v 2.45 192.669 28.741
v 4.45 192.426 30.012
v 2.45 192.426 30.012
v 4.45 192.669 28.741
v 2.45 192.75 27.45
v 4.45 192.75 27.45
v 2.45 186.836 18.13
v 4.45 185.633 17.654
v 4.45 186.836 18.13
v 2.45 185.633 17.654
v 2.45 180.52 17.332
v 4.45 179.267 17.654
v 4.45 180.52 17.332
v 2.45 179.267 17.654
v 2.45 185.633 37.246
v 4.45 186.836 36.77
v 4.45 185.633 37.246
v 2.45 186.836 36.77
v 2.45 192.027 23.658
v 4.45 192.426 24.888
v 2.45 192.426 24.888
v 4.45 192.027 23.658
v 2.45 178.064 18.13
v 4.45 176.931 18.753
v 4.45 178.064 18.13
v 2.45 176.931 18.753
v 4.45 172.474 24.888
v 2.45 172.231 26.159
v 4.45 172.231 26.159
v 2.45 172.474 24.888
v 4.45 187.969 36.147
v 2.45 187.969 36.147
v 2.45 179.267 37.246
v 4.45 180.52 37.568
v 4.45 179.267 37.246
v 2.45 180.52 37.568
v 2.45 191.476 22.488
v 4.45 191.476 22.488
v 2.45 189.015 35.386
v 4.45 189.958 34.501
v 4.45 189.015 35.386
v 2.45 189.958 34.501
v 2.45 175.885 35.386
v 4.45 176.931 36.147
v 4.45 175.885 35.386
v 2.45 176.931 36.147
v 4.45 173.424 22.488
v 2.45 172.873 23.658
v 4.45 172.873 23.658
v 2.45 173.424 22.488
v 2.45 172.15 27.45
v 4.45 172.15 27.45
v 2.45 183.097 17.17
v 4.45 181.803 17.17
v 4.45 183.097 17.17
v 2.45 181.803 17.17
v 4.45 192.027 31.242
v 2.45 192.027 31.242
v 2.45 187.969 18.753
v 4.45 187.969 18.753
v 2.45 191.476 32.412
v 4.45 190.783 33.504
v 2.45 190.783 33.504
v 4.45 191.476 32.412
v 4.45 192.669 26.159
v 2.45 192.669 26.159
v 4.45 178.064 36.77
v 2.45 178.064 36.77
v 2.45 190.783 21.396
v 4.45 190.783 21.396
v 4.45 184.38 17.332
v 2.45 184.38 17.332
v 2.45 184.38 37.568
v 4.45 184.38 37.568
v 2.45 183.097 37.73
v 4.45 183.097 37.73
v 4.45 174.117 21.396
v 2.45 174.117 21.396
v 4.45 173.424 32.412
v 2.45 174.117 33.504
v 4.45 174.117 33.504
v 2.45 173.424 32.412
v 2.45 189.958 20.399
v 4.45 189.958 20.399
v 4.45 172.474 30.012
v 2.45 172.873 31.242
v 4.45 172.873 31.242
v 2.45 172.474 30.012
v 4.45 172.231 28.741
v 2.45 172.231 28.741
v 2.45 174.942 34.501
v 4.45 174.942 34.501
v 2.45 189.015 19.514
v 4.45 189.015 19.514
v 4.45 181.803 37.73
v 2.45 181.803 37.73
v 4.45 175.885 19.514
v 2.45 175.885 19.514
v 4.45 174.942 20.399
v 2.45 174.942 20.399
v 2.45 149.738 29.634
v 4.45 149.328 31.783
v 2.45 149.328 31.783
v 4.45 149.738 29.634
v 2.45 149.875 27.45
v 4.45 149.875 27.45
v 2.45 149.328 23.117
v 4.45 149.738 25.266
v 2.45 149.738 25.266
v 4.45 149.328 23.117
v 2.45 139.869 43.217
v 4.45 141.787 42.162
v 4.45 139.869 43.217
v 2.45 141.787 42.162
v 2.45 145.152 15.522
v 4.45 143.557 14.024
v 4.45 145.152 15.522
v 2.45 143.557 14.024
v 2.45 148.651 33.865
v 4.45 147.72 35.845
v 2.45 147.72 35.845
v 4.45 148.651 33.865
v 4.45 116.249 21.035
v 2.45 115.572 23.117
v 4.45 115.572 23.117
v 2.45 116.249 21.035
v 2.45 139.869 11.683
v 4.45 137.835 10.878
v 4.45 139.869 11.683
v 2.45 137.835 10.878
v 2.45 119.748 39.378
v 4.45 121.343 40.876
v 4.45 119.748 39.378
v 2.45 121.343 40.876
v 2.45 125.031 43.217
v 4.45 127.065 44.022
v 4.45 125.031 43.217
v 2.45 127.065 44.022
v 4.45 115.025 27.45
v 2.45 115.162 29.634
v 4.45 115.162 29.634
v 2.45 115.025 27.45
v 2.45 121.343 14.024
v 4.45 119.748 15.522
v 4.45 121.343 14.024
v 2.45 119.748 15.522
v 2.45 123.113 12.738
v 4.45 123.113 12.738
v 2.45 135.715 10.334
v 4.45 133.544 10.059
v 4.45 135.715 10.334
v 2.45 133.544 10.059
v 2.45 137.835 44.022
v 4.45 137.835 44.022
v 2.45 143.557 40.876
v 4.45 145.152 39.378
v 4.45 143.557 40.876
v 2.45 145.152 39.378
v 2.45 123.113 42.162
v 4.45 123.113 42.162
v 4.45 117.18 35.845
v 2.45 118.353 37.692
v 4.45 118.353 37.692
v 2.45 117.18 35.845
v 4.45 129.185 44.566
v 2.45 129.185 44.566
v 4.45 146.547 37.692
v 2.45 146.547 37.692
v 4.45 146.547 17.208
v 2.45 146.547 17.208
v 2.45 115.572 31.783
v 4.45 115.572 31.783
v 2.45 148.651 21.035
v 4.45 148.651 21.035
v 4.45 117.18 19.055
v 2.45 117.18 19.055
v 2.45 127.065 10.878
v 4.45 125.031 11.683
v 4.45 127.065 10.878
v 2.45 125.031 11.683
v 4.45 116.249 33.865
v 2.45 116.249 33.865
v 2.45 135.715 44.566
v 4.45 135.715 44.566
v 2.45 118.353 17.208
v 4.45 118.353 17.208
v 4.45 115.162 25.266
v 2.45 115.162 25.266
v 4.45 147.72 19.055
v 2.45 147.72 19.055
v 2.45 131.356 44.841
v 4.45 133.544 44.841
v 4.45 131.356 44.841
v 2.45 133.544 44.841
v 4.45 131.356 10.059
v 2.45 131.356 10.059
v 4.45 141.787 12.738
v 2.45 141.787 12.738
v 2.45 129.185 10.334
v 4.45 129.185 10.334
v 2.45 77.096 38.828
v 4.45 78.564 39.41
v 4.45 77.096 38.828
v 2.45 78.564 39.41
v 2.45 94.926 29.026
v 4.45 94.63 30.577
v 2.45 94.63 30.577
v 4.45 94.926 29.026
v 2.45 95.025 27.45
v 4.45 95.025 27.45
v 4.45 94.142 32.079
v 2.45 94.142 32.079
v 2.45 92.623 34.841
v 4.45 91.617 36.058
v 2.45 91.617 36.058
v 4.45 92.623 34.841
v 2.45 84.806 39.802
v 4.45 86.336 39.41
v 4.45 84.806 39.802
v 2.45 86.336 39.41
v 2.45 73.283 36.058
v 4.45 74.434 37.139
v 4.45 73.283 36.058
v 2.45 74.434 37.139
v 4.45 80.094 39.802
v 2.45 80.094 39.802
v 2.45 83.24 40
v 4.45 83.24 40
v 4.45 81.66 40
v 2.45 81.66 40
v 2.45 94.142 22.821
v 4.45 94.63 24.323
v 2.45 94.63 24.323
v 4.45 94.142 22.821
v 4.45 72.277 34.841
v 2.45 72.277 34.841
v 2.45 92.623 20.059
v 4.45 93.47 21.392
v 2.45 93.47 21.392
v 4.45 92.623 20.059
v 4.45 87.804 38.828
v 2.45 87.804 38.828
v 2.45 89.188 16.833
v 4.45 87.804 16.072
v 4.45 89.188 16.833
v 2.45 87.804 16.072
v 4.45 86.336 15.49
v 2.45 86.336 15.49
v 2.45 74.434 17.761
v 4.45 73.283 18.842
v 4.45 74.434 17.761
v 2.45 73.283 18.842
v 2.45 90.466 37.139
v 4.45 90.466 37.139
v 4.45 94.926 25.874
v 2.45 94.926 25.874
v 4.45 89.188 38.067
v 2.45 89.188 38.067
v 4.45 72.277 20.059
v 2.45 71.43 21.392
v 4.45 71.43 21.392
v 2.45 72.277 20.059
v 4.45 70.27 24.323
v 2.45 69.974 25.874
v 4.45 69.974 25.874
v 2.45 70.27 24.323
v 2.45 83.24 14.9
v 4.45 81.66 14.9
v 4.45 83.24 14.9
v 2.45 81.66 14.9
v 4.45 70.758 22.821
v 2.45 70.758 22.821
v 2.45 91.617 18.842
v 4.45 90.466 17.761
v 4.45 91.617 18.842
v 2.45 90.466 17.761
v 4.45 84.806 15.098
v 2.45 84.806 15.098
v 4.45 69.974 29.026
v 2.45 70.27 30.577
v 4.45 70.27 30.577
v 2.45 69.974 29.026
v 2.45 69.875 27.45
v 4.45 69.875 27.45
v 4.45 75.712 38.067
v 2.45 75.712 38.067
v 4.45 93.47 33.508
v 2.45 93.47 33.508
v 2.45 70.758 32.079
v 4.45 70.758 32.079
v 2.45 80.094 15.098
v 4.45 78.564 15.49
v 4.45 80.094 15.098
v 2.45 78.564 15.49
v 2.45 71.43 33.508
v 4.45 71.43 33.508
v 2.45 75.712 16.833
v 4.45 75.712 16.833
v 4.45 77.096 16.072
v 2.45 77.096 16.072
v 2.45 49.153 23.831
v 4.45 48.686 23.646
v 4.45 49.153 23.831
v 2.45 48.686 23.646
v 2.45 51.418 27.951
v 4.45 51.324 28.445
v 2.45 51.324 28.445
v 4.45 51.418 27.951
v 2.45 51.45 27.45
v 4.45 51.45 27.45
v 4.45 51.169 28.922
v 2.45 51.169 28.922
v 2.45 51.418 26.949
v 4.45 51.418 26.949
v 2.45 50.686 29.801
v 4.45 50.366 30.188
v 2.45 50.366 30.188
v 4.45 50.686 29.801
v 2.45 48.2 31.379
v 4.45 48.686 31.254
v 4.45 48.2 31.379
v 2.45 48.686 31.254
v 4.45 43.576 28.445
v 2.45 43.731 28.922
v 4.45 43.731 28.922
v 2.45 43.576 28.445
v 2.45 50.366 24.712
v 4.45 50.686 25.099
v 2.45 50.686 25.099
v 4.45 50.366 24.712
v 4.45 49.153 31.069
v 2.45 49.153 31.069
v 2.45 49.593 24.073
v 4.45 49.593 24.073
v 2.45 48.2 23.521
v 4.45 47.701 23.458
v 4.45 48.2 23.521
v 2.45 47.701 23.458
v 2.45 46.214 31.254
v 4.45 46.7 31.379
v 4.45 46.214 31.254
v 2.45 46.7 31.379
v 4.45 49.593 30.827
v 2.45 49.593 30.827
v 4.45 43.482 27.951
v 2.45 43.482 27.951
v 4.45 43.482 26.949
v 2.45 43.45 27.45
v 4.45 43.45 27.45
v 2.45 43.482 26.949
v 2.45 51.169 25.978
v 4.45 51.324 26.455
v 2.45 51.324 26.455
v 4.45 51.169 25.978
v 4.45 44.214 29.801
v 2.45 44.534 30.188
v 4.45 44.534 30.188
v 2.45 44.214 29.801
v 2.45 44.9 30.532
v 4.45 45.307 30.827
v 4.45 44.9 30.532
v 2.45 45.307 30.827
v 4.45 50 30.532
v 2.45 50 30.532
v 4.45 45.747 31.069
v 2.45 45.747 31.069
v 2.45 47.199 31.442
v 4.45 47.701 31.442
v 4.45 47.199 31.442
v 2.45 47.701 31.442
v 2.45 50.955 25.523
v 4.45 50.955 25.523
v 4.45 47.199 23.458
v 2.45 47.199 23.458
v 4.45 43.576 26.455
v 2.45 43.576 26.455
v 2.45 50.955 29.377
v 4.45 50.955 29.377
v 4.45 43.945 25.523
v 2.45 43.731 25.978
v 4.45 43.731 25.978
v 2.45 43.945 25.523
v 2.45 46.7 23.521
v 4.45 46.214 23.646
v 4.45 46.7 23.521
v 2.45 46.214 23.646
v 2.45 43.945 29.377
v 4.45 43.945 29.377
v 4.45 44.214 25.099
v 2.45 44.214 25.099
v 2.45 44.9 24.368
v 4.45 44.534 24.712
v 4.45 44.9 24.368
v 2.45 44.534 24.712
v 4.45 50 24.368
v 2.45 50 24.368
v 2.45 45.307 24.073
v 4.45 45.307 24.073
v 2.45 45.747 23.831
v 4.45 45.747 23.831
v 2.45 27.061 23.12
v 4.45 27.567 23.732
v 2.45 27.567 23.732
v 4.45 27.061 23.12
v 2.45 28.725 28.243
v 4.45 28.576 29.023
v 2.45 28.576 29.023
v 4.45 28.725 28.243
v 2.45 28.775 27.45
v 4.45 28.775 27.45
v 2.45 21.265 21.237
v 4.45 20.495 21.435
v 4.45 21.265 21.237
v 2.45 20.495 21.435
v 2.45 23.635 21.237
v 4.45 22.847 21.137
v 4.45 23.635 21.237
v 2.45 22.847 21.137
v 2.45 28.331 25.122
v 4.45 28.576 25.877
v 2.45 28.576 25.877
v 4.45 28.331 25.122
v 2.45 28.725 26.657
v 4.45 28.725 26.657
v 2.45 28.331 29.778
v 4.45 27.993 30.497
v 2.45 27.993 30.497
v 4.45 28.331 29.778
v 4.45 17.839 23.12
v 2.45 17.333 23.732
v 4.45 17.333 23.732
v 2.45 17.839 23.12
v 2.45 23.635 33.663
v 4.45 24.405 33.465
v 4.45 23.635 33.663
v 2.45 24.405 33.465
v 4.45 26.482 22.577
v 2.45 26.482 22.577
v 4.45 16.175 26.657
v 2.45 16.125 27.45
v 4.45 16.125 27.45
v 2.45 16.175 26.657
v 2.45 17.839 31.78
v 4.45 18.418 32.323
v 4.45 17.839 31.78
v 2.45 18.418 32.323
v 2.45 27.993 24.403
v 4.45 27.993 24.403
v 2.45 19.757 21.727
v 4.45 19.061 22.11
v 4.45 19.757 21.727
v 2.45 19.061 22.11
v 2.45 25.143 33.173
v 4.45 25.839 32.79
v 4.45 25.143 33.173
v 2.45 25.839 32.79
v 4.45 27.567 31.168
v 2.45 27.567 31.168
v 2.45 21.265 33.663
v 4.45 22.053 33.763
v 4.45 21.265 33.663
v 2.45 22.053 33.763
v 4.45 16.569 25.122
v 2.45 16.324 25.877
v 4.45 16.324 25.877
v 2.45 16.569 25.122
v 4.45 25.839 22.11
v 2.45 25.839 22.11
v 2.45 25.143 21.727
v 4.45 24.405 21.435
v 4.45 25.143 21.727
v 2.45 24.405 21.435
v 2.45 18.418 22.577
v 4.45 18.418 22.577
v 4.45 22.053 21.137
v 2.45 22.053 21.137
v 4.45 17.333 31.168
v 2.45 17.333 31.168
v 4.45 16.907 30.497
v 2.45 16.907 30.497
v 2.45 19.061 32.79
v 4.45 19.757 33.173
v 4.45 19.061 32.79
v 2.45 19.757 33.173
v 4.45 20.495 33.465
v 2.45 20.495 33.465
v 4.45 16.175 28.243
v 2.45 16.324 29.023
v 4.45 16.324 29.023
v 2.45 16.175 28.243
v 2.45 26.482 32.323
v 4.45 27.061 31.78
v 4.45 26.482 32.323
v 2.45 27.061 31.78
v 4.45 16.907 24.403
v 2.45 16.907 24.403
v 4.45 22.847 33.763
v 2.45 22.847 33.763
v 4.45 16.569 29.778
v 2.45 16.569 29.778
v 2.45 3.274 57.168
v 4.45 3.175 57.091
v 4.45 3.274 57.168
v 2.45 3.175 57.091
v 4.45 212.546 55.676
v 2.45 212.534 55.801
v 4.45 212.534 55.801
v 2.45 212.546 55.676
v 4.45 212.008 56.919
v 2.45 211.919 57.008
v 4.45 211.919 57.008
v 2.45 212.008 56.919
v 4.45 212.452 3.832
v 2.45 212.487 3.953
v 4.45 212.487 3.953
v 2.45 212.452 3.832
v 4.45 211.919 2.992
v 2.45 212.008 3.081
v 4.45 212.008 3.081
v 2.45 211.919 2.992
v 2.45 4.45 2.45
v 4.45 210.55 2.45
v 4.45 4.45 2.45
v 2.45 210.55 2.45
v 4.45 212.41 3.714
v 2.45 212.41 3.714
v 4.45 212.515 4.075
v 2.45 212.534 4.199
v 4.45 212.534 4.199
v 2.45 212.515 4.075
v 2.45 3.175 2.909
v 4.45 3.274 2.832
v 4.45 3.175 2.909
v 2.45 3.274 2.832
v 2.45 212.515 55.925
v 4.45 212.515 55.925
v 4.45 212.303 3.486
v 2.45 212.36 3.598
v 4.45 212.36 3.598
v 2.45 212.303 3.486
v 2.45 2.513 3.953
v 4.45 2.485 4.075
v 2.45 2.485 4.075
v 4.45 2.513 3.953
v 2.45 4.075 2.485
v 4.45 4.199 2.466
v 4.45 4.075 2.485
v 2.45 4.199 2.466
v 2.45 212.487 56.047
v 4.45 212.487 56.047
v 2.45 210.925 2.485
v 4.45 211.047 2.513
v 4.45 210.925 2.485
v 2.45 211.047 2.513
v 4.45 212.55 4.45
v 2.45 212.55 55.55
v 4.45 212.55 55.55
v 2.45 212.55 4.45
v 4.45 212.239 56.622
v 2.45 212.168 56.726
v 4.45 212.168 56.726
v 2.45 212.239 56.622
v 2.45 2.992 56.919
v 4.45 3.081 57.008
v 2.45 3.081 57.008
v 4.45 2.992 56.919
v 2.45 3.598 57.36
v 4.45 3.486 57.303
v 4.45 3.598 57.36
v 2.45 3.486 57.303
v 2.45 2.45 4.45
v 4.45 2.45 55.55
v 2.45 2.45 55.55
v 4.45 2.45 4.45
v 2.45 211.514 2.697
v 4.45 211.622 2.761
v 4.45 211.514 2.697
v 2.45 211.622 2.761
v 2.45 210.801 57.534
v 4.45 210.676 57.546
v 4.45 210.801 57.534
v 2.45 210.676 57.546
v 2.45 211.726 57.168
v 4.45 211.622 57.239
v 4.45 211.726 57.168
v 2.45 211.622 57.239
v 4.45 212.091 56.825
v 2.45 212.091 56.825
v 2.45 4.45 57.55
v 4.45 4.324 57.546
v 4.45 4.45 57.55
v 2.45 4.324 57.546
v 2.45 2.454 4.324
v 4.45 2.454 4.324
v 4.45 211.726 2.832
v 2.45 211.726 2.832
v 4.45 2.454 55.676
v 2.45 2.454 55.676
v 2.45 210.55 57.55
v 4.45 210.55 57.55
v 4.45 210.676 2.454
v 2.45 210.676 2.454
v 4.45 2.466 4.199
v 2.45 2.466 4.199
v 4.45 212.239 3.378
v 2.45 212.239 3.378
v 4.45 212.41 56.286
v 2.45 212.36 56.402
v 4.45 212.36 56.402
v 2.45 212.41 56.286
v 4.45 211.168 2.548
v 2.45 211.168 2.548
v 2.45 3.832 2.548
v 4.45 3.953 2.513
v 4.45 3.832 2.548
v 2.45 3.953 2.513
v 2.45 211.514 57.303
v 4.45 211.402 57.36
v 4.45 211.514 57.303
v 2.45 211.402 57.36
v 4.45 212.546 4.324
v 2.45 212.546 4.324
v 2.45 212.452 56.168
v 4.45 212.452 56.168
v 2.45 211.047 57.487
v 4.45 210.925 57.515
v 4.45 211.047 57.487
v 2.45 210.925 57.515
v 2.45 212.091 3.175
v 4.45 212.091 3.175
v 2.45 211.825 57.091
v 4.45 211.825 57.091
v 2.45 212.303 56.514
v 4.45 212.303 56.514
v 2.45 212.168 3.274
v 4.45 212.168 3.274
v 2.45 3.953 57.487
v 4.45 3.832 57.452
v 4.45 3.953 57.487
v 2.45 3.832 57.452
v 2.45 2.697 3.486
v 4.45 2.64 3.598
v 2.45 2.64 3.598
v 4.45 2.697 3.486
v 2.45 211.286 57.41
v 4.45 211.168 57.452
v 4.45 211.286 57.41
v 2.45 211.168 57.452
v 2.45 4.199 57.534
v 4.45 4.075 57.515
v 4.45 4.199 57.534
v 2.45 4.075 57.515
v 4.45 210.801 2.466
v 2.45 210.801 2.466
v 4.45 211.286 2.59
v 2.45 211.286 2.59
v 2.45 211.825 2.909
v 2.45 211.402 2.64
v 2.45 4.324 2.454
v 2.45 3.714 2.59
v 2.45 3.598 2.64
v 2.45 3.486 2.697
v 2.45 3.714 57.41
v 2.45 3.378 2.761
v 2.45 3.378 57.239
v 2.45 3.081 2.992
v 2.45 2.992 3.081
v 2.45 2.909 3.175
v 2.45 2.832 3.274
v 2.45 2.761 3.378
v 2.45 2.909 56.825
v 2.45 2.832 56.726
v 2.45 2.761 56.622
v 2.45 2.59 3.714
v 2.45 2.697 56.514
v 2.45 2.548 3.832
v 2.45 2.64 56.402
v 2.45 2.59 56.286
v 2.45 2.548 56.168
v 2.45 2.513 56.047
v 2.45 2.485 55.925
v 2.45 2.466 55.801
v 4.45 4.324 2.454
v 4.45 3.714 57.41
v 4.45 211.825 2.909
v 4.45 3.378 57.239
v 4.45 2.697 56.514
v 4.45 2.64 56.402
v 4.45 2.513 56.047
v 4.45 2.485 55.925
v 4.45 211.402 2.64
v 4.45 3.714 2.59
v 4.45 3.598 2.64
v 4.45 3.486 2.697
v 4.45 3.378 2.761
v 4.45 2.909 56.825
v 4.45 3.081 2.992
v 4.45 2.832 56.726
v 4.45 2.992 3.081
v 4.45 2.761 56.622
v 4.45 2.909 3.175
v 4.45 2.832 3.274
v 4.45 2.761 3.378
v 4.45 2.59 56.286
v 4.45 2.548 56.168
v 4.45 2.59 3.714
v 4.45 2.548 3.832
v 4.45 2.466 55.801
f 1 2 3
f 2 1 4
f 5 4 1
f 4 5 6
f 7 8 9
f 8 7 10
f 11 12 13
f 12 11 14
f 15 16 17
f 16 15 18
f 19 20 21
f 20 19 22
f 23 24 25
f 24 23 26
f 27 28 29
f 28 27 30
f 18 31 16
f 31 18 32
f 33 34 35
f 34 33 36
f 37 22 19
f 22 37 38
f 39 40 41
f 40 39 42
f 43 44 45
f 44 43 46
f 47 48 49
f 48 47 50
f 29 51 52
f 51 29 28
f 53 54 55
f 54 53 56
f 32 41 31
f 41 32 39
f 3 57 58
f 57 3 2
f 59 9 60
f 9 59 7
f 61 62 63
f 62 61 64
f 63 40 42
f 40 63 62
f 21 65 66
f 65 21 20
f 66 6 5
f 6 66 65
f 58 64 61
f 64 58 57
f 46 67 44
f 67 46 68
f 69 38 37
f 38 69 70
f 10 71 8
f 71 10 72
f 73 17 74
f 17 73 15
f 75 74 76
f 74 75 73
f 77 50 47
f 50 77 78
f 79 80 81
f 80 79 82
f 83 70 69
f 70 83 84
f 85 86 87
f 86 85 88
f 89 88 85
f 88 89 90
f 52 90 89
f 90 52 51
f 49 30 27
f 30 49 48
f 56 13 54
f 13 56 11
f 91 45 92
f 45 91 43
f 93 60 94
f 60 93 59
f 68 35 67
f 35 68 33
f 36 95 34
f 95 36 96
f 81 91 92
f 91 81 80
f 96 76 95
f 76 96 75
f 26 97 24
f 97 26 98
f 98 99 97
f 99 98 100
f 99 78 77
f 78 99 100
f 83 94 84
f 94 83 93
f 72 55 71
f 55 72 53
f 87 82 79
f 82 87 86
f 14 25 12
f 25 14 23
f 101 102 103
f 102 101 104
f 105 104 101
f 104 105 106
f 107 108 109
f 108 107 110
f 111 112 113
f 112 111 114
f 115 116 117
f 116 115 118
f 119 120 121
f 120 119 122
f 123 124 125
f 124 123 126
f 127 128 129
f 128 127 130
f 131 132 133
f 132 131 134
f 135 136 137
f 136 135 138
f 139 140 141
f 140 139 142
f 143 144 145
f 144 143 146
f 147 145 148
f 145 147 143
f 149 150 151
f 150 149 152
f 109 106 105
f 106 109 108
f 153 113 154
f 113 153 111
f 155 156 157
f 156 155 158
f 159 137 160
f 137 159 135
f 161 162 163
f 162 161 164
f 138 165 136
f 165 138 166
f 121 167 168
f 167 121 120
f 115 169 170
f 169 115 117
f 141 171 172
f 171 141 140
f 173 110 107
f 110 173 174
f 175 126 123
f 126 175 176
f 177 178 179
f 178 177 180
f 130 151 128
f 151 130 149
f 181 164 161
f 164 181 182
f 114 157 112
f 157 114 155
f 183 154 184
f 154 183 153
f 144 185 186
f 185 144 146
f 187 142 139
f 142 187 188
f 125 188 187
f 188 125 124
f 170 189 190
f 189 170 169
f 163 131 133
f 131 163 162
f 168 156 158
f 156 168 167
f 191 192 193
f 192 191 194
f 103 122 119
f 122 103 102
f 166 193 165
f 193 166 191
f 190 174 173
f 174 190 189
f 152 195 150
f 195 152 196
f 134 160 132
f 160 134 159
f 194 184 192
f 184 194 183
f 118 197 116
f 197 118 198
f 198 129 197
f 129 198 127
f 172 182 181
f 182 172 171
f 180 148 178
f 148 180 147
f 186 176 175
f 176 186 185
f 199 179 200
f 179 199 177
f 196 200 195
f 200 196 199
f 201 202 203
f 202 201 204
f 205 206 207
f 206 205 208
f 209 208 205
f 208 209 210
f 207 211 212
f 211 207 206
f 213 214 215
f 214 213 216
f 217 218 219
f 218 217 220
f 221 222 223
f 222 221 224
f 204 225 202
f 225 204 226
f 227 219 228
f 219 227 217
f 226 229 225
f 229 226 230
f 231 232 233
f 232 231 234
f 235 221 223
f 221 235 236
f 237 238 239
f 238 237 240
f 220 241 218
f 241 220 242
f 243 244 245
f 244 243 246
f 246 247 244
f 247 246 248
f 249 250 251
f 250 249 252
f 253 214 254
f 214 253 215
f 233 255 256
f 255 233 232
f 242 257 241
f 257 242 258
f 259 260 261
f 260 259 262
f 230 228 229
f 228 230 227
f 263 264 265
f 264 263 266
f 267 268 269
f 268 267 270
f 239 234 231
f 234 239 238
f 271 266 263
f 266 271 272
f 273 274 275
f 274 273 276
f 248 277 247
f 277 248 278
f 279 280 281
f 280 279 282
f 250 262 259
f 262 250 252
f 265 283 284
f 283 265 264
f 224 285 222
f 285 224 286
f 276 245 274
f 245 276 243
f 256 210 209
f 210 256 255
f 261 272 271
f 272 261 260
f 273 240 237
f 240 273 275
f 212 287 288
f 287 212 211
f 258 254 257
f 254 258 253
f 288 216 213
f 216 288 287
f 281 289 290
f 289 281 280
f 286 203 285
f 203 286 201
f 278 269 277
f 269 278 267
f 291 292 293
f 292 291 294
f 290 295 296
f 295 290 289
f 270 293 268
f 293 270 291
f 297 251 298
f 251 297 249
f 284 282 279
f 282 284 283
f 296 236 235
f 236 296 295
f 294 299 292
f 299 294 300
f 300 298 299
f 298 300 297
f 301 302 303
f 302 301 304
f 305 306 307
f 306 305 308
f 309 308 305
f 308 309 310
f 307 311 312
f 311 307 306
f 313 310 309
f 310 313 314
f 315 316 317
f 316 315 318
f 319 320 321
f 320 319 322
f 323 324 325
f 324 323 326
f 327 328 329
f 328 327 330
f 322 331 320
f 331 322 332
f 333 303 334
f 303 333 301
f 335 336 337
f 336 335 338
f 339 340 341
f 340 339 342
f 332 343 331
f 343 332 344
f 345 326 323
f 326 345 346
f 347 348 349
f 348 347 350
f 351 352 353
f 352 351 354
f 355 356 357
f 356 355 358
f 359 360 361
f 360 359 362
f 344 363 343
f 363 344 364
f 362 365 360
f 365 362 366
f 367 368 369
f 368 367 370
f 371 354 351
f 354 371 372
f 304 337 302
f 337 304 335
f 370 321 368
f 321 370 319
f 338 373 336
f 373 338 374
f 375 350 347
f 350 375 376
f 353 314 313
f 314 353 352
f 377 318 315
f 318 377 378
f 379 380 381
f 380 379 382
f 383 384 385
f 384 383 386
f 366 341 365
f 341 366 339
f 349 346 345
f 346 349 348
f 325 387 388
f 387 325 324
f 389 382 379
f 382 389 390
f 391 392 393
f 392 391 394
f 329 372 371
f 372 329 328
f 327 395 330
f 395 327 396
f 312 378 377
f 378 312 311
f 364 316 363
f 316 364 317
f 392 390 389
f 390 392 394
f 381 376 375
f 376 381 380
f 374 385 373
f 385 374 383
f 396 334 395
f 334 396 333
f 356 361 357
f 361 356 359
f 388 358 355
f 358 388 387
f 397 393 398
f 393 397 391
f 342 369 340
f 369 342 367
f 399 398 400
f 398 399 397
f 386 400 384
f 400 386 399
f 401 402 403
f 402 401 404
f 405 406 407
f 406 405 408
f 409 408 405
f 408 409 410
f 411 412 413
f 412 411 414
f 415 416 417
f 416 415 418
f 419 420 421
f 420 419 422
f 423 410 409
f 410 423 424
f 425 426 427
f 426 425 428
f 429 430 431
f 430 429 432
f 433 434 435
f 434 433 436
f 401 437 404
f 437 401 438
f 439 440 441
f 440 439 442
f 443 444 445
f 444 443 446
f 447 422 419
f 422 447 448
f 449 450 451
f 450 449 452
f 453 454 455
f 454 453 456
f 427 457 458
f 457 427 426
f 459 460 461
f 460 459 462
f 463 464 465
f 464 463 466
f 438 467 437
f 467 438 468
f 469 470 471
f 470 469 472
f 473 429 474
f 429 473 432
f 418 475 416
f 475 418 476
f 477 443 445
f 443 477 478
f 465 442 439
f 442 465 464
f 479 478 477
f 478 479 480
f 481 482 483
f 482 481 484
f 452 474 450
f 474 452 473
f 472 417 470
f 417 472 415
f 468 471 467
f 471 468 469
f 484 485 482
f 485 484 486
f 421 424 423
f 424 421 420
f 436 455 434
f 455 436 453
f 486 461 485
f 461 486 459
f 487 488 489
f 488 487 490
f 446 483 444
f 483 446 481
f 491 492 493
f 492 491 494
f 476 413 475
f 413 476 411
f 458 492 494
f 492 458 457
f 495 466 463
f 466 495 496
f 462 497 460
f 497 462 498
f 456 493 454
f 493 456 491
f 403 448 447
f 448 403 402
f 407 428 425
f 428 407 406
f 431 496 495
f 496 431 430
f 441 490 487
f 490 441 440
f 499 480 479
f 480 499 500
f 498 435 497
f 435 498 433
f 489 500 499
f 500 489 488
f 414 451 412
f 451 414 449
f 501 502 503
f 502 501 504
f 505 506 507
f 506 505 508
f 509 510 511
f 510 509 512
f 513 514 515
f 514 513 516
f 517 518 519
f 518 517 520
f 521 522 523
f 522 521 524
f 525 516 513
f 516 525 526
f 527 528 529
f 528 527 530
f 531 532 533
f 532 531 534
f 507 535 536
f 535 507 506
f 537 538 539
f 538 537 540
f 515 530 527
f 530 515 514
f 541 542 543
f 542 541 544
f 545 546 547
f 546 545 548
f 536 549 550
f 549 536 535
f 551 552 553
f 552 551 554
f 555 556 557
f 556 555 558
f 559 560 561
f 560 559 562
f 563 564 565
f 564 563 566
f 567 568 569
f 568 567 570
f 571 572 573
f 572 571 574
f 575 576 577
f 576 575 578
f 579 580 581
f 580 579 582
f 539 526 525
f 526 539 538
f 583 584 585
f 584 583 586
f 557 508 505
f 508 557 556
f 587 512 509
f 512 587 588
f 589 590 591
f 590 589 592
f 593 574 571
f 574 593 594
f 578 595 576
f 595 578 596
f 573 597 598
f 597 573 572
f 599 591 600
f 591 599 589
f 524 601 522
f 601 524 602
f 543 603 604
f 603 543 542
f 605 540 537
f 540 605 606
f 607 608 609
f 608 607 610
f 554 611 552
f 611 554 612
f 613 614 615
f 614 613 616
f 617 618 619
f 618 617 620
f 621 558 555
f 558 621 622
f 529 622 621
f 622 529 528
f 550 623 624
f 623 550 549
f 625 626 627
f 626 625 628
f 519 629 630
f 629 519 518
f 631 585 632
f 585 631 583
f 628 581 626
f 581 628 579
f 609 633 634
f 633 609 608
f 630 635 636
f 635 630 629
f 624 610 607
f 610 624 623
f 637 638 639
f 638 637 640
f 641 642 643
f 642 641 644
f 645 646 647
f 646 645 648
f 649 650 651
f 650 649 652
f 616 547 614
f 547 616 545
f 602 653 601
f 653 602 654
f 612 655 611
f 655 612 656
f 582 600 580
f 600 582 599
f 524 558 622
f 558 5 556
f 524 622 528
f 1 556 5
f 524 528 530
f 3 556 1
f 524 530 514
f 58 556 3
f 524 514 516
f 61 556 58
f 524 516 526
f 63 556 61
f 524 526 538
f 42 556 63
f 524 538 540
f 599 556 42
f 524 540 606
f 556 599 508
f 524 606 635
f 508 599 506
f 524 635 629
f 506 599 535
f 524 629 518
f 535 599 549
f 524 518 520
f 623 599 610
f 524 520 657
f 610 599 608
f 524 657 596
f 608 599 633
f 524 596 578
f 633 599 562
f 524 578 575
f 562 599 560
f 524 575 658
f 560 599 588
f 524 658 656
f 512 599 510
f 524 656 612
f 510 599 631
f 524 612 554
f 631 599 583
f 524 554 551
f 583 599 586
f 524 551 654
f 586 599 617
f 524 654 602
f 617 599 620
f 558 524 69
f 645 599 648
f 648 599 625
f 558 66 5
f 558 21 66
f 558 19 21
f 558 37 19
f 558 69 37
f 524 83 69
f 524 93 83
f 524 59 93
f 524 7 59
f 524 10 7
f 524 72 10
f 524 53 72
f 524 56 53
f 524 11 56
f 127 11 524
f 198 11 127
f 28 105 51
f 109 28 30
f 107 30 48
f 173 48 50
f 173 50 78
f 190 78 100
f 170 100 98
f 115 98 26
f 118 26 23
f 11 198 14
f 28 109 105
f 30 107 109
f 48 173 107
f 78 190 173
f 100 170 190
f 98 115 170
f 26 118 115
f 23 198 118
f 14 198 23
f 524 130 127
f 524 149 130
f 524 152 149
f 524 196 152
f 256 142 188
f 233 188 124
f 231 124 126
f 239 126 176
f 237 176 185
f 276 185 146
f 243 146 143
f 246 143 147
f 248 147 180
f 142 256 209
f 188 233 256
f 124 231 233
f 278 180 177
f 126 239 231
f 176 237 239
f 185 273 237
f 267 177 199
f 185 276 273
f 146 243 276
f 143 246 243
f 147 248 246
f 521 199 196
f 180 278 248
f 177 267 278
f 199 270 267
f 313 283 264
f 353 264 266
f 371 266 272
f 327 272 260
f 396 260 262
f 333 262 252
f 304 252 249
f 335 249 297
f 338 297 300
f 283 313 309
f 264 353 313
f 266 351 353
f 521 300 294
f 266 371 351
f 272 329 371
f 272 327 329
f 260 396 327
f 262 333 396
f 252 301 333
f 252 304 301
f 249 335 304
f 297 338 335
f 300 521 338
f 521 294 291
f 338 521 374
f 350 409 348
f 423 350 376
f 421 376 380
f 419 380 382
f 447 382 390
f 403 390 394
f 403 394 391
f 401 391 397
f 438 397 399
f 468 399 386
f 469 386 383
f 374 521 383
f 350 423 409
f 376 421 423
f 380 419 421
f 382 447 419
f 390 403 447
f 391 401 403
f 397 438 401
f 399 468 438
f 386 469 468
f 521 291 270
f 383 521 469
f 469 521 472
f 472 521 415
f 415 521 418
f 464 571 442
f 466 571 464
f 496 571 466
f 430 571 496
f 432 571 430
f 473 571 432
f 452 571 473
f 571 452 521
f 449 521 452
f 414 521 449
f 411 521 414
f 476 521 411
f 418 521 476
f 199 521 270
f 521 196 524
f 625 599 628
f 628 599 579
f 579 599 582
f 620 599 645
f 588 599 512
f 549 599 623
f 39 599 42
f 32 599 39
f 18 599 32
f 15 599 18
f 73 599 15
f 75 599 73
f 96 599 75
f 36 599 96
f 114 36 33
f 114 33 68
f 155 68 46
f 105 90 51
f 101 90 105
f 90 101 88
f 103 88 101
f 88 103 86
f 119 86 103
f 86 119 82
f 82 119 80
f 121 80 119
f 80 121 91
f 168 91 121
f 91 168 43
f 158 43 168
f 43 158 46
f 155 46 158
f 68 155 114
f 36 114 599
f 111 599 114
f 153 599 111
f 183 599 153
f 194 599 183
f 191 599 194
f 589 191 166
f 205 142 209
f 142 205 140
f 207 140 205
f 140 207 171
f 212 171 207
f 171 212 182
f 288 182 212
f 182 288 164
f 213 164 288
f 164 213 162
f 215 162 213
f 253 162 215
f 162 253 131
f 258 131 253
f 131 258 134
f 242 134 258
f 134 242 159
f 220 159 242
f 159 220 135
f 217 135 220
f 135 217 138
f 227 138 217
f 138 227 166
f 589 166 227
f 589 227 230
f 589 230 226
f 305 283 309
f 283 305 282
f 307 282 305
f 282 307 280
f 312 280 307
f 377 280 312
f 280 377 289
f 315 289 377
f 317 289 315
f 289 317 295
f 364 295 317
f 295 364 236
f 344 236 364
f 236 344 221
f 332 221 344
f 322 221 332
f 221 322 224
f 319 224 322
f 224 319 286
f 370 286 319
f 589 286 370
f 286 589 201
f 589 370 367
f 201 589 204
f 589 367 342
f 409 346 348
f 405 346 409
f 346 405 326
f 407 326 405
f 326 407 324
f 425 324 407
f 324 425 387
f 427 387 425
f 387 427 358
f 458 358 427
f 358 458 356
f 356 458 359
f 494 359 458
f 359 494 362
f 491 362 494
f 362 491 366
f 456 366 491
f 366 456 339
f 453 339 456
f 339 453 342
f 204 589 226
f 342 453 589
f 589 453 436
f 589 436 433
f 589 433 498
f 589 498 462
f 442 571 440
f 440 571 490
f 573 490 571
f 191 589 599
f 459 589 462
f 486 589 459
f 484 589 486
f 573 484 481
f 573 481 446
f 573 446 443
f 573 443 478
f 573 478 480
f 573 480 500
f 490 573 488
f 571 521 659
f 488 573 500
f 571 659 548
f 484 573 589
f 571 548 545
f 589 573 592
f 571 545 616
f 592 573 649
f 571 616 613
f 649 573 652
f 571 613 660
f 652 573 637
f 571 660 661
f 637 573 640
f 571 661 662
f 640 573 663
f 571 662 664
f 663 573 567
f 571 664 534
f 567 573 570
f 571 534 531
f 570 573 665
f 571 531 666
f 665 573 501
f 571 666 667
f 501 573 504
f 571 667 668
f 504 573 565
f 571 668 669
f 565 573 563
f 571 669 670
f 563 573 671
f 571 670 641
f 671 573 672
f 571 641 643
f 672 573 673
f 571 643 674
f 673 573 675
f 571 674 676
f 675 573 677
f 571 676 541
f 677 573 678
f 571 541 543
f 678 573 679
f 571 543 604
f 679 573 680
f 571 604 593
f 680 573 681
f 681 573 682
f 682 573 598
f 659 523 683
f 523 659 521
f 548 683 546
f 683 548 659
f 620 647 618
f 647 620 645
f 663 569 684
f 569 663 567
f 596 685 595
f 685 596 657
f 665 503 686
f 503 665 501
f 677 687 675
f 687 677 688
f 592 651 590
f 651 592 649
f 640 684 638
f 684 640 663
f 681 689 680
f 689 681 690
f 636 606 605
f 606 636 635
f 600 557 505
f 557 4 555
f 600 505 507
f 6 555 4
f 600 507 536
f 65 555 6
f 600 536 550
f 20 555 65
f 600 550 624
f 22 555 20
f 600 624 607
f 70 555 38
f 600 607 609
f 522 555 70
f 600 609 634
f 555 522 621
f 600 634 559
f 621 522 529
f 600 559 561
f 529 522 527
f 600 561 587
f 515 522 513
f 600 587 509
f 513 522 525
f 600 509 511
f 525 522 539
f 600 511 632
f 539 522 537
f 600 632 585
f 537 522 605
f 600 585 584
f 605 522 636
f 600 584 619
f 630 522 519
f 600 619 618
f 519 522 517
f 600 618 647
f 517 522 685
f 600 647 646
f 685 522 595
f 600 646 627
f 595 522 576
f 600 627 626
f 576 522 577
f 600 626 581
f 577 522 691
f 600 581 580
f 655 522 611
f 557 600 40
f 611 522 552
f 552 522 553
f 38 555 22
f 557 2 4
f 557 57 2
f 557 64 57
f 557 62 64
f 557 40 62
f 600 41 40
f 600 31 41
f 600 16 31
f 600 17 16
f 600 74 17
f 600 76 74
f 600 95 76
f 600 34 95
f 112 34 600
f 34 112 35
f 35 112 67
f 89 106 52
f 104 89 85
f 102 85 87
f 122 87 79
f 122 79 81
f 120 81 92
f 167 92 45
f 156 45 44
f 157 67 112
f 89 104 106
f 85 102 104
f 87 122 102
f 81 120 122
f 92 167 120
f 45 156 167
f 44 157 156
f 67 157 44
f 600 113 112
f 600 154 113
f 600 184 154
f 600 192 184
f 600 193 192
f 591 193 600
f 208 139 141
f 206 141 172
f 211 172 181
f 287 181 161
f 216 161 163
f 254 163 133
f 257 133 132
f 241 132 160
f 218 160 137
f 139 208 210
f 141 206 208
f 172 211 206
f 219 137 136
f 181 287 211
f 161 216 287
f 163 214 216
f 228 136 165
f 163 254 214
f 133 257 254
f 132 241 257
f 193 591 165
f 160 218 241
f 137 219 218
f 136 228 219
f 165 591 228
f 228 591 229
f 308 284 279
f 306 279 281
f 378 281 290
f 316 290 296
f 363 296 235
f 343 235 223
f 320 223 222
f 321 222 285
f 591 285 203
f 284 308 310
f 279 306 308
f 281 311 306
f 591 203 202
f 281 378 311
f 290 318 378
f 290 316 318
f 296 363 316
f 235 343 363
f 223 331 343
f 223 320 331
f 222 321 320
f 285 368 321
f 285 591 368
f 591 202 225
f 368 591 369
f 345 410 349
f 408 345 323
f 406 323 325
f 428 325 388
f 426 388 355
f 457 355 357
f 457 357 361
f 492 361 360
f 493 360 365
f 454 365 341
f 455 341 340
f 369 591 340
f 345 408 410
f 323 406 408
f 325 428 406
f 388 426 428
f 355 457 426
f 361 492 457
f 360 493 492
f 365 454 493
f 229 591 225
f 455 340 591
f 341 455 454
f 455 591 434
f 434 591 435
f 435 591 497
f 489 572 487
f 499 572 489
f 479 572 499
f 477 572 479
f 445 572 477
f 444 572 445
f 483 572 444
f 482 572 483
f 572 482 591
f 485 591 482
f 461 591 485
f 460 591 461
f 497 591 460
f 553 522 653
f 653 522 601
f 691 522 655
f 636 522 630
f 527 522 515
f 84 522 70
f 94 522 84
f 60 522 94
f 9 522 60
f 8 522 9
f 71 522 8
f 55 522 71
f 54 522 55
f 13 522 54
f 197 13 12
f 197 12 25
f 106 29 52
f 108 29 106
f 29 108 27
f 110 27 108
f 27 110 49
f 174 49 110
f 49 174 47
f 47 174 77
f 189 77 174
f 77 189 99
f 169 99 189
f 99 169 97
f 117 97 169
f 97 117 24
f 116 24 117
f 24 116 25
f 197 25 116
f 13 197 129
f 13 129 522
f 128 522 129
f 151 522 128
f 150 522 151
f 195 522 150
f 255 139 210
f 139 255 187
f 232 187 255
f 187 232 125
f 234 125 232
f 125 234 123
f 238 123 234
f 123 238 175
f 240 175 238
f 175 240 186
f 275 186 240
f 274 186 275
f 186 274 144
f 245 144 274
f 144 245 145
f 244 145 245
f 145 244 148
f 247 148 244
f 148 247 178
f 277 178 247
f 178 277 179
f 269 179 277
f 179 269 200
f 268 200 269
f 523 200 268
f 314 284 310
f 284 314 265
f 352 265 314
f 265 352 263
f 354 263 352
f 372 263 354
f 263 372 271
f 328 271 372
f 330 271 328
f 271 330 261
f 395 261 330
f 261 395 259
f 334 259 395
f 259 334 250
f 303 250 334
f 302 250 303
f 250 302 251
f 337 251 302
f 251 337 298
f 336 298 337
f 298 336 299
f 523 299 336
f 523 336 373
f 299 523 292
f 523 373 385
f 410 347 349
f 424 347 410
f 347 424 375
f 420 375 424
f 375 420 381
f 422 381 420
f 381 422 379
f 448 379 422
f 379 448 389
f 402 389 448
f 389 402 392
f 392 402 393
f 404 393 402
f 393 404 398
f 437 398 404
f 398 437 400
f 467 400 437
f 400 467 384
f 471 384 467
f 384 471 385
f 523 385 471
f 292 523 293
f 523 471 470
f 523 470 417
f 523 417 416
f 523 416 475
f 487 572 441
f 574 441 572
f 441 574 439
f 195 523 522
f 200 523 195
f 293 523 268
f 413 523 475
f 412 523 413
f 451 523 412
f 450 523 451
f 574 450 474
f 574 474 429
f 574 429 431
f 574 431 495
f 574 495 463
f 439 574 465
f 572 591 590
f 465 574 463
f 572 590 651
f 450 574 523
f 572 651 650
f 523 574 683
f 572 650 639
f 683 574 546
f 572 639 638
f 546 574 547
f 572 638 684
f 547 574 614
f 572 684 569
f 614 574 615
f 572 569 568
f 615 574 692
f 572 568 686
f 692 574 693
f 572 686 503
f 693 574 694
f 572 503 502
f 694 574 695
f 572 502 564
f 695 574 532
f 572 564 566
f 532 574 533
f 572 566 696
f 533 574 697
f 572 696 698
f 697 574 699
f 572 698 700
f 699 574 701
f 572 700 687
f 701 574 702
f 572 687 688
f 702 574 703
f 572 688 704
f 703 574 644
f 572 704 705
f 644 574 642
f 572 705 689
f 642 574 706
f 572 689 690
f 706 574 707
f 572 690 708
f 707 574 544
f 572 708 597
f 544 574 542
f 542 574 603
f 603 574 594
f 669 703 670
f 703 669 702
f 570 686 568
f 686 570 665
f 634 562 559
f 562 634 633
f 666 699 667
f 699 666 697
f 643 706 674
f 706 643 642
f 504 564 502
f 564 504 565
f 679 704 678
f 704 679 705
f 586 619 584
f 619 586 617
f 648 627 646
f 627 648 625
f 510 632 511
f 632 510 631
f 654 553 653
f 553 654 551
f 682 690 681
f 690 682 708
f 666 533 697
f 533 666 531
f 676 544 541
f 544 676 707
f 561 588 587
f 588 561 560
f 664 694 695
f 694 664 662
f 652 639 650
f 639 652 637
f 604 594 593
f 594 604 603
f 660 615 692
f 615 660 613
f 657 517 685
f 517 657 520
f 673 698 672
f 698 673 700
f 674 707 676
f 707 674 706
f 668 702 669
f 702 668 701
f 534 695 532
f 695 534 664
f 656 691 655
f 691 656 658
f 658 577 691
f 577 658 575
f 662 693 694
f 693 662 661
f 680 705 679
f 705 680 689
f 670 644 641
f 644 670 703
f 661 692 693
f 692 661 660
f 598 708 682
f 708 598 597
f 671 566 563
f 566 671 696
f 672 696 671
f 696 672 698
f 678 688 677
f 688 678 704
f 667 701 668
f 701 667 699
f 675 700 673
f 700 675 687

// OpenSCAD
/*//////////////////////////////////////////////////////////////////
              -    FB Aka Heartman/Hearty 2016     -
              -   http://heartygfx.blogspot.com    -
              -       OpenScad Parametric Box      -
              -         CC BY-NC 3.0 License       -
////////////////////////////////////////////////////////////////////
12/02/2016 - Fixed minor bug
28/02/2016 - Added holes ventilation option
09/03/2016 - Added PCB feet support, fixed the shell artefact on export mode.

*/////////////////////////// - Info - //////////////////////////////

// All coordinates are starting as integrated circuit pins.
// From the top view :

//   CoordD           <---       CoordC
//                                 ^
//                                 ^
//                                 ^
//   CoordA           --->       CoordB


////////////////////////////////////////////////////////////////////


// Params

// -----------------------------------------------------------------------------
//  Box Dimensions
// -----------------------------------------------------------------------------
Length        = 254; // 10.0 in
Width         = 215; // ~8.5 in
Height        = 60;
Thick         = 2;//[2:5]

// -----------------------------------------------------------------------------
//  Box Options
// -----------------------------------------------------------------------------
// Filet Diameter
Filet         = 2;    // {0.1..12}
// Filet Smoothness
Resolution    = 50;   // {1..1000}
// Tolerance (Panel/Rails Gap)
m             = 0.9;
// Decorations to Ventilation Holes
Vent          = 1;// [0:No, 1:Yes]
// Decoration-Holes width (in mm)
Vent_Width    = 1.5;

// -----------------------------------------------------------------------------
//  PCB Feet
//    - All dimensions are from the center foot axis
// -----------------------------------------------------------------------------
// Low Left Corner X Position
PCBPosX       = 70;
// Low Left Corner Y Position
PCBPosY       = 60;
// PCB Length
PCBLength     = 50.1;
// PCB Width
PCBWidth      = 94.7;
// Feet Height
FootHeight    = 10;
// Foot Diameter
FootDia       = 8;
// Hole diameter
FootHole      = 3;

// -----------------------------------------------------------------------------
//  STL element to Export
// -----------------------------------------------------------------------------
// Top Shell
TShell        = 0; // {0:No, 1:Yes}
// Bottom Shell
BShell        = 0; // {0:No, 1:Yes}
// Front Panel
FPanL         = 0; // {0:No, 1:Yes}
// Back Panel
BPanL         = 1; // {0:No, 1:Yes}

// -----------------------------------------------------------------------------
//  Hidden
// -----------------------------------------------------------------------------
// Shell color
Couleur1        = "Orange";
// Panels color
Couleur2        = "OrangeRed";
// Thick X 2 - Making Decorations Thicker for Vents to go Through Shell
Dec_Thick       = Vent ? Thick*2 : Thick;
// Depth Decoration
Dec_Size        = Vent ? Thick*2 : 0.8;

// -----------------------------------------------------------------------------
//  Generic Rounded Box Module
// -----------------------------------------------------------------------------
module RoundBox($a=Length, $b=Width, $c=Height)
{
    $fn=Resolution;
    translate([0,Filet,Filet])
    {
        minkowski()
        {
            cube ([$a-(Length/2),$b-(2*Filet),$c-(2*Filet)], center = false);
            rotate([0,90,0])
            {
                cylinder(r=Filet,h=Length/2, center = false);
            }
        }
    }
} // RoundBox

// -----------------------------------------------------------------------------
//  Shell
// -----------------------------------------------------------------------------
module Shell()
{
    Thick = Thick*2;
    difference()
    {
        // Sides Decoration
        difference()
        {
            union()
            {
                // Substract Fileted Box
                difference()
                {
                    // Subtract Median Cube Slicer
                    difference()
                    {
                        union()
                        {
                            difference()
                            {
                                RoundBox();
                                translate([Thick/2,Thick/2,Thick/2])
                                {
                                    RoundBox($a=Length-Thick, $b=Width-Thick, $c=Height-Thick);
                                }
                            }
                            // Rails
                            difference()
                            {
                                // Rails
                                translate([Thick+m,Thick/2,Thick/2])
                                {
                                    RoundBox($a=Length-((2*Thick)+(2*m)), $b=Width-Thick, $c=Height-(Thick*2));
                                } // Rails
                                translate([((Thick+m/2)*1.55),Thick/2,Thick/2+0.1])
                                {
                                    RoundBox($a=Length-((Thick*3)+2*m), $b=Width-Thick, $c=Height-Thick);
                                }
                            }// Rails
                        } // Union
                        translate([-Thick,-Thick,Height/2])
                        {
                            cube([Length+100, Width+100, Height], center=false);
                        }
                    } // End Median cube slicer
                    translate([-Thick/2,Thick,Thick])
                    {
                        RoundBox($a=Length+Thick, $b=Width-Thick*2, $c=Height-Thick);
                    }
                }
                difference()
                {
                    union()
                    {
                        translate([3*Thick +5,Thick,Height/2])
                        {
                            rotate([90,0,0])
                            {
                                    $fn=6;
                                    cylinder(d=16,Thick/2);
                            }
                        }
                        translate([Length-((3*Thick)+5),Thick,Height/2])
                        {
                            rotate([90,0,0])
                            {
                                $fn=6;
                                cylinder(d=16,Thick/2);
                            }
                        }
                    }
                    translate([4,Thick+Filet,Height/2-57])
                    {
                        rotate([45,0,0])
                        {
                            cube([Length,40,40]);
                        }
                    }
                    translate([0,-(Thick*1.46),Height/2])
                    {
                        cube([Length,Thick*2,10]);
                    }
                } //Fin fixation box legs
            }

            union()
            {// outbox sides decorations
                for(i=[0:Thick:Length/4])
                {
                    // Ventilation holes part code submitted by Ettie - Thanks ;)
                    translate([10+i,-Dec_Thick+Dec_Size,1])
                    {
                        cube([Vent_Width,Dec_Thick,Height/4]);
                    }
                    translate([(Length-10) - i,-Dec_Thick+Dec_Size,1])
                    {
                        cube([Vent_Width,Dec_Thick,Height/4]);
                    }
                    translate([(Length-10) - i,Width-Dec_Size,1])
                    {
                        cube([Vent_Width,Dec_Thick,Height/4]);
                    }
                    translate([10+i,Width-Dec_Size,1])
                    {
                        cube([Vent_Width,Dec_Thick,Height/4]);
                    }
                }
            }
        }
        union()
        { //sides holes
            $fn=50;
            translate([3*Thick+5,20,Height/2+4])
            {
                rotate([90,0,0])
                {
                    cylinder(d=2,20);
                }
            }
            translate([Length-((3*Thick)+5),20,Height/2+4])
            {
                rotate([90,0,0])
                {
                    cylinder(d=2,20);
                }
            }
            translate([3*Thick+5,Width+5,Height/2-4])
            {
                rotate([90,0,0])
                {
                    cylinder(d=2,20);
                }
            }
            translate([Length-((3*Thick)+5),Width+5,Height/2-4])
            {
                rotate([90,0,0])
                {
                    cylinder(d=2,20);
                }
            }
        } // Side Holes
    }
}

// Foot with base
module foot(FootDia, FootHole, FootHeight)
{
    Filet=2;
    color(Couleur1)
    translate([0,0,Filet-1.5])
    difference()
    {
        difference()
        {
            cylinder(d=FootDia+Filet,FootHeight-Thick, $fn=100);
            rotate_extrude($fn=100)
            {
                translate([(FootDia+Filet*2)/2,Filet,0])
                {
                    minkowski()
                    {
                        square(10);
                        circle(Filet, $fn=100);
                    }
                }
            }
        }
        cylinder(d=FootHole,FootHeight+1, $fn=100);
    }
}

module Feet()
{
    // Board
    translate([3*Thick+2,Thick+5,FootHeight+(Thick/2)-0.5])
    {

        %square ([PCBLength+10,PCBWidth+10]);
        translate([PCBLength/2,PCBWidth/2,0.5])
        {
            color("Olive")
            %text("PCB", halign="center", valign="center", font="Arial black");
        }
    }

    // Feed
    translate([3*Thick+7,Thick+10,Thick/2])
    {
        foot(FootDia,FootHole,FootHeight);
    }
    translate([(3*Thick)+PCBLength+7,Thick+10,Thick/2])
    {
    foot(FootDia,FootHole,FootHeight);
    }
    translate([(3*Thick)+PCBLength+7,(Thick)+PCBWidth+10,Thick/2])
    {
        foot(FootDia,FootHole,FootHeight);
    }
    translate([3*Thick+7,(Thick)+PCBWidth+10,Thick/2])
    {
        foot(FootDia,FootHole,FootHeight);
    }
}

// Panel
module Panel(Length, Width, Thick, Filet)
{
    scale([0.5,1,1])
    minkowski()
    {
        cube([Thick,Width-(Thick*2+Filet*2+m),Height-(Thick*2+Filet*2+m)]);
        translate([0,Filet,Filet])
        rotate([0,90,0])
        cylinder(r=Filet,h=Thick, $fn=100);
    }
}

// Cylinder
module CylinderHole(OnOff, Cx, Cy, Cdia)
{
    if(OnOff==1)
    {
        translate([Cx,Cy,-1])
        {
            cylinder(d=Cdia,10, $fn=50);
        }
    }
}

// Text Panel
module LText(OnOff, Tx, Ty, Font, Size, Content)
{
    if(OnOff==1)
    {
        translate([Tx,Ty,Thick+0])
        {
            linear_extrude(height = 0.5)
            {
                text(Content, size=Size, font=Font);
            }
        }
    }
}

// Front Panel
module FPanL()
{
    // Settings
    FPH = (Height/2)-5;
    AIR = 6.2;
    BNC = 12.6;

    difference()
    {

        // Front Panel
        Panel(Length,Width,Thick,Filet);

        // Front Panel Holes
        rotate([90,0,90])
        {
            // Power Switch -- (On/Off, Xpos, Ypos, Diameter)
            CylinderHole(1, 180, FPH, 17.75);

            // Power LED -- (On/Off, Xpos, Ypos, Diameter)
            CylinderHole(1, 160, FPH, 6.85);

            // Air -- (On/Off, Xpos, Ypos, Diameter)
            CylinderHole(1, 130, FPH, AIR);
            CylinderHole(1, 115, FPH, AIR);
            CylinderHole(1, 100, FPH, AIR);
            CylinderHole(1,  85, FPH, AIR);

            // BNC
            CylinderHole(1,  55, FPH, BNC);
            CylinderHole(1,  30, FPH, BNC);

        }

        // Front Panel Text
        translate([-.5,0,0])
        {
            rotate([90,0,90])
            {
                LText(1, 10, 35, "Arial Black", 4, "VPS");
            }
        }
    }
}

// Front Panel
module BPanL()
{
    // Settings
    BPH = (Height/2)-5;
    USB_ETH = 20.60;

    difference()
    {

        // Back Panel
        Panel(Length,Width,Thick,Filet);

        // Back Panel Holes
        rotate([90,0,90])
        {
            // Ethernet -- (On/Off, Xpos, Ypos, Diameter)
            CylinderHole(1, 180, BPH, 20.60);

            // USB-B -- (On/Off, Xpos, Ypos, Diameter)
            CylinderHole(1, 130, BPH, 34.85);

            // USB-A -- (On/Off, Xpos, Ypos, Diameter)
            CylinderHole(1,  80, BPH, 25.15);

            // Power Input -- (On/Off, Xpos, Ypos, Diameter)
            CylinderHole(1, 45, BPH, 8);

            // Fuse -- (On/Off, Xpos, Ypos, Diameter)
            CylinderHole(1, 20, BPH, 12.65);

        }
    }
}

// Main Construction
if(TShell==1)
{
    color( Couleur1,1)
    {
        translate([0,Width,Height+0.2])
        {
            rotate([0,180,180])
            {
                Shell();
            }
        }
    }
}

if(BShell==1)
{
    color(Couleur1)
    {
        Shell();
    }
}

if (BShell==1)
{
    translate([PCBPosX,PCBPosY,0])
    {
        Feet();
    }
}

// Front Panel
if(FPanL==1)
{
    translate([Length-(Thick*2+m/2),Thick+m/2,Thick+m/2])
    {
        FPanL();
    }
}

// Back Panel
if(BPanL==1)
{
    color(Couleur2)
    {
        translate([Thick+m/2,Thick+m/2,Thick+m/2])
        {
            BPanL();
        }
    }
}
